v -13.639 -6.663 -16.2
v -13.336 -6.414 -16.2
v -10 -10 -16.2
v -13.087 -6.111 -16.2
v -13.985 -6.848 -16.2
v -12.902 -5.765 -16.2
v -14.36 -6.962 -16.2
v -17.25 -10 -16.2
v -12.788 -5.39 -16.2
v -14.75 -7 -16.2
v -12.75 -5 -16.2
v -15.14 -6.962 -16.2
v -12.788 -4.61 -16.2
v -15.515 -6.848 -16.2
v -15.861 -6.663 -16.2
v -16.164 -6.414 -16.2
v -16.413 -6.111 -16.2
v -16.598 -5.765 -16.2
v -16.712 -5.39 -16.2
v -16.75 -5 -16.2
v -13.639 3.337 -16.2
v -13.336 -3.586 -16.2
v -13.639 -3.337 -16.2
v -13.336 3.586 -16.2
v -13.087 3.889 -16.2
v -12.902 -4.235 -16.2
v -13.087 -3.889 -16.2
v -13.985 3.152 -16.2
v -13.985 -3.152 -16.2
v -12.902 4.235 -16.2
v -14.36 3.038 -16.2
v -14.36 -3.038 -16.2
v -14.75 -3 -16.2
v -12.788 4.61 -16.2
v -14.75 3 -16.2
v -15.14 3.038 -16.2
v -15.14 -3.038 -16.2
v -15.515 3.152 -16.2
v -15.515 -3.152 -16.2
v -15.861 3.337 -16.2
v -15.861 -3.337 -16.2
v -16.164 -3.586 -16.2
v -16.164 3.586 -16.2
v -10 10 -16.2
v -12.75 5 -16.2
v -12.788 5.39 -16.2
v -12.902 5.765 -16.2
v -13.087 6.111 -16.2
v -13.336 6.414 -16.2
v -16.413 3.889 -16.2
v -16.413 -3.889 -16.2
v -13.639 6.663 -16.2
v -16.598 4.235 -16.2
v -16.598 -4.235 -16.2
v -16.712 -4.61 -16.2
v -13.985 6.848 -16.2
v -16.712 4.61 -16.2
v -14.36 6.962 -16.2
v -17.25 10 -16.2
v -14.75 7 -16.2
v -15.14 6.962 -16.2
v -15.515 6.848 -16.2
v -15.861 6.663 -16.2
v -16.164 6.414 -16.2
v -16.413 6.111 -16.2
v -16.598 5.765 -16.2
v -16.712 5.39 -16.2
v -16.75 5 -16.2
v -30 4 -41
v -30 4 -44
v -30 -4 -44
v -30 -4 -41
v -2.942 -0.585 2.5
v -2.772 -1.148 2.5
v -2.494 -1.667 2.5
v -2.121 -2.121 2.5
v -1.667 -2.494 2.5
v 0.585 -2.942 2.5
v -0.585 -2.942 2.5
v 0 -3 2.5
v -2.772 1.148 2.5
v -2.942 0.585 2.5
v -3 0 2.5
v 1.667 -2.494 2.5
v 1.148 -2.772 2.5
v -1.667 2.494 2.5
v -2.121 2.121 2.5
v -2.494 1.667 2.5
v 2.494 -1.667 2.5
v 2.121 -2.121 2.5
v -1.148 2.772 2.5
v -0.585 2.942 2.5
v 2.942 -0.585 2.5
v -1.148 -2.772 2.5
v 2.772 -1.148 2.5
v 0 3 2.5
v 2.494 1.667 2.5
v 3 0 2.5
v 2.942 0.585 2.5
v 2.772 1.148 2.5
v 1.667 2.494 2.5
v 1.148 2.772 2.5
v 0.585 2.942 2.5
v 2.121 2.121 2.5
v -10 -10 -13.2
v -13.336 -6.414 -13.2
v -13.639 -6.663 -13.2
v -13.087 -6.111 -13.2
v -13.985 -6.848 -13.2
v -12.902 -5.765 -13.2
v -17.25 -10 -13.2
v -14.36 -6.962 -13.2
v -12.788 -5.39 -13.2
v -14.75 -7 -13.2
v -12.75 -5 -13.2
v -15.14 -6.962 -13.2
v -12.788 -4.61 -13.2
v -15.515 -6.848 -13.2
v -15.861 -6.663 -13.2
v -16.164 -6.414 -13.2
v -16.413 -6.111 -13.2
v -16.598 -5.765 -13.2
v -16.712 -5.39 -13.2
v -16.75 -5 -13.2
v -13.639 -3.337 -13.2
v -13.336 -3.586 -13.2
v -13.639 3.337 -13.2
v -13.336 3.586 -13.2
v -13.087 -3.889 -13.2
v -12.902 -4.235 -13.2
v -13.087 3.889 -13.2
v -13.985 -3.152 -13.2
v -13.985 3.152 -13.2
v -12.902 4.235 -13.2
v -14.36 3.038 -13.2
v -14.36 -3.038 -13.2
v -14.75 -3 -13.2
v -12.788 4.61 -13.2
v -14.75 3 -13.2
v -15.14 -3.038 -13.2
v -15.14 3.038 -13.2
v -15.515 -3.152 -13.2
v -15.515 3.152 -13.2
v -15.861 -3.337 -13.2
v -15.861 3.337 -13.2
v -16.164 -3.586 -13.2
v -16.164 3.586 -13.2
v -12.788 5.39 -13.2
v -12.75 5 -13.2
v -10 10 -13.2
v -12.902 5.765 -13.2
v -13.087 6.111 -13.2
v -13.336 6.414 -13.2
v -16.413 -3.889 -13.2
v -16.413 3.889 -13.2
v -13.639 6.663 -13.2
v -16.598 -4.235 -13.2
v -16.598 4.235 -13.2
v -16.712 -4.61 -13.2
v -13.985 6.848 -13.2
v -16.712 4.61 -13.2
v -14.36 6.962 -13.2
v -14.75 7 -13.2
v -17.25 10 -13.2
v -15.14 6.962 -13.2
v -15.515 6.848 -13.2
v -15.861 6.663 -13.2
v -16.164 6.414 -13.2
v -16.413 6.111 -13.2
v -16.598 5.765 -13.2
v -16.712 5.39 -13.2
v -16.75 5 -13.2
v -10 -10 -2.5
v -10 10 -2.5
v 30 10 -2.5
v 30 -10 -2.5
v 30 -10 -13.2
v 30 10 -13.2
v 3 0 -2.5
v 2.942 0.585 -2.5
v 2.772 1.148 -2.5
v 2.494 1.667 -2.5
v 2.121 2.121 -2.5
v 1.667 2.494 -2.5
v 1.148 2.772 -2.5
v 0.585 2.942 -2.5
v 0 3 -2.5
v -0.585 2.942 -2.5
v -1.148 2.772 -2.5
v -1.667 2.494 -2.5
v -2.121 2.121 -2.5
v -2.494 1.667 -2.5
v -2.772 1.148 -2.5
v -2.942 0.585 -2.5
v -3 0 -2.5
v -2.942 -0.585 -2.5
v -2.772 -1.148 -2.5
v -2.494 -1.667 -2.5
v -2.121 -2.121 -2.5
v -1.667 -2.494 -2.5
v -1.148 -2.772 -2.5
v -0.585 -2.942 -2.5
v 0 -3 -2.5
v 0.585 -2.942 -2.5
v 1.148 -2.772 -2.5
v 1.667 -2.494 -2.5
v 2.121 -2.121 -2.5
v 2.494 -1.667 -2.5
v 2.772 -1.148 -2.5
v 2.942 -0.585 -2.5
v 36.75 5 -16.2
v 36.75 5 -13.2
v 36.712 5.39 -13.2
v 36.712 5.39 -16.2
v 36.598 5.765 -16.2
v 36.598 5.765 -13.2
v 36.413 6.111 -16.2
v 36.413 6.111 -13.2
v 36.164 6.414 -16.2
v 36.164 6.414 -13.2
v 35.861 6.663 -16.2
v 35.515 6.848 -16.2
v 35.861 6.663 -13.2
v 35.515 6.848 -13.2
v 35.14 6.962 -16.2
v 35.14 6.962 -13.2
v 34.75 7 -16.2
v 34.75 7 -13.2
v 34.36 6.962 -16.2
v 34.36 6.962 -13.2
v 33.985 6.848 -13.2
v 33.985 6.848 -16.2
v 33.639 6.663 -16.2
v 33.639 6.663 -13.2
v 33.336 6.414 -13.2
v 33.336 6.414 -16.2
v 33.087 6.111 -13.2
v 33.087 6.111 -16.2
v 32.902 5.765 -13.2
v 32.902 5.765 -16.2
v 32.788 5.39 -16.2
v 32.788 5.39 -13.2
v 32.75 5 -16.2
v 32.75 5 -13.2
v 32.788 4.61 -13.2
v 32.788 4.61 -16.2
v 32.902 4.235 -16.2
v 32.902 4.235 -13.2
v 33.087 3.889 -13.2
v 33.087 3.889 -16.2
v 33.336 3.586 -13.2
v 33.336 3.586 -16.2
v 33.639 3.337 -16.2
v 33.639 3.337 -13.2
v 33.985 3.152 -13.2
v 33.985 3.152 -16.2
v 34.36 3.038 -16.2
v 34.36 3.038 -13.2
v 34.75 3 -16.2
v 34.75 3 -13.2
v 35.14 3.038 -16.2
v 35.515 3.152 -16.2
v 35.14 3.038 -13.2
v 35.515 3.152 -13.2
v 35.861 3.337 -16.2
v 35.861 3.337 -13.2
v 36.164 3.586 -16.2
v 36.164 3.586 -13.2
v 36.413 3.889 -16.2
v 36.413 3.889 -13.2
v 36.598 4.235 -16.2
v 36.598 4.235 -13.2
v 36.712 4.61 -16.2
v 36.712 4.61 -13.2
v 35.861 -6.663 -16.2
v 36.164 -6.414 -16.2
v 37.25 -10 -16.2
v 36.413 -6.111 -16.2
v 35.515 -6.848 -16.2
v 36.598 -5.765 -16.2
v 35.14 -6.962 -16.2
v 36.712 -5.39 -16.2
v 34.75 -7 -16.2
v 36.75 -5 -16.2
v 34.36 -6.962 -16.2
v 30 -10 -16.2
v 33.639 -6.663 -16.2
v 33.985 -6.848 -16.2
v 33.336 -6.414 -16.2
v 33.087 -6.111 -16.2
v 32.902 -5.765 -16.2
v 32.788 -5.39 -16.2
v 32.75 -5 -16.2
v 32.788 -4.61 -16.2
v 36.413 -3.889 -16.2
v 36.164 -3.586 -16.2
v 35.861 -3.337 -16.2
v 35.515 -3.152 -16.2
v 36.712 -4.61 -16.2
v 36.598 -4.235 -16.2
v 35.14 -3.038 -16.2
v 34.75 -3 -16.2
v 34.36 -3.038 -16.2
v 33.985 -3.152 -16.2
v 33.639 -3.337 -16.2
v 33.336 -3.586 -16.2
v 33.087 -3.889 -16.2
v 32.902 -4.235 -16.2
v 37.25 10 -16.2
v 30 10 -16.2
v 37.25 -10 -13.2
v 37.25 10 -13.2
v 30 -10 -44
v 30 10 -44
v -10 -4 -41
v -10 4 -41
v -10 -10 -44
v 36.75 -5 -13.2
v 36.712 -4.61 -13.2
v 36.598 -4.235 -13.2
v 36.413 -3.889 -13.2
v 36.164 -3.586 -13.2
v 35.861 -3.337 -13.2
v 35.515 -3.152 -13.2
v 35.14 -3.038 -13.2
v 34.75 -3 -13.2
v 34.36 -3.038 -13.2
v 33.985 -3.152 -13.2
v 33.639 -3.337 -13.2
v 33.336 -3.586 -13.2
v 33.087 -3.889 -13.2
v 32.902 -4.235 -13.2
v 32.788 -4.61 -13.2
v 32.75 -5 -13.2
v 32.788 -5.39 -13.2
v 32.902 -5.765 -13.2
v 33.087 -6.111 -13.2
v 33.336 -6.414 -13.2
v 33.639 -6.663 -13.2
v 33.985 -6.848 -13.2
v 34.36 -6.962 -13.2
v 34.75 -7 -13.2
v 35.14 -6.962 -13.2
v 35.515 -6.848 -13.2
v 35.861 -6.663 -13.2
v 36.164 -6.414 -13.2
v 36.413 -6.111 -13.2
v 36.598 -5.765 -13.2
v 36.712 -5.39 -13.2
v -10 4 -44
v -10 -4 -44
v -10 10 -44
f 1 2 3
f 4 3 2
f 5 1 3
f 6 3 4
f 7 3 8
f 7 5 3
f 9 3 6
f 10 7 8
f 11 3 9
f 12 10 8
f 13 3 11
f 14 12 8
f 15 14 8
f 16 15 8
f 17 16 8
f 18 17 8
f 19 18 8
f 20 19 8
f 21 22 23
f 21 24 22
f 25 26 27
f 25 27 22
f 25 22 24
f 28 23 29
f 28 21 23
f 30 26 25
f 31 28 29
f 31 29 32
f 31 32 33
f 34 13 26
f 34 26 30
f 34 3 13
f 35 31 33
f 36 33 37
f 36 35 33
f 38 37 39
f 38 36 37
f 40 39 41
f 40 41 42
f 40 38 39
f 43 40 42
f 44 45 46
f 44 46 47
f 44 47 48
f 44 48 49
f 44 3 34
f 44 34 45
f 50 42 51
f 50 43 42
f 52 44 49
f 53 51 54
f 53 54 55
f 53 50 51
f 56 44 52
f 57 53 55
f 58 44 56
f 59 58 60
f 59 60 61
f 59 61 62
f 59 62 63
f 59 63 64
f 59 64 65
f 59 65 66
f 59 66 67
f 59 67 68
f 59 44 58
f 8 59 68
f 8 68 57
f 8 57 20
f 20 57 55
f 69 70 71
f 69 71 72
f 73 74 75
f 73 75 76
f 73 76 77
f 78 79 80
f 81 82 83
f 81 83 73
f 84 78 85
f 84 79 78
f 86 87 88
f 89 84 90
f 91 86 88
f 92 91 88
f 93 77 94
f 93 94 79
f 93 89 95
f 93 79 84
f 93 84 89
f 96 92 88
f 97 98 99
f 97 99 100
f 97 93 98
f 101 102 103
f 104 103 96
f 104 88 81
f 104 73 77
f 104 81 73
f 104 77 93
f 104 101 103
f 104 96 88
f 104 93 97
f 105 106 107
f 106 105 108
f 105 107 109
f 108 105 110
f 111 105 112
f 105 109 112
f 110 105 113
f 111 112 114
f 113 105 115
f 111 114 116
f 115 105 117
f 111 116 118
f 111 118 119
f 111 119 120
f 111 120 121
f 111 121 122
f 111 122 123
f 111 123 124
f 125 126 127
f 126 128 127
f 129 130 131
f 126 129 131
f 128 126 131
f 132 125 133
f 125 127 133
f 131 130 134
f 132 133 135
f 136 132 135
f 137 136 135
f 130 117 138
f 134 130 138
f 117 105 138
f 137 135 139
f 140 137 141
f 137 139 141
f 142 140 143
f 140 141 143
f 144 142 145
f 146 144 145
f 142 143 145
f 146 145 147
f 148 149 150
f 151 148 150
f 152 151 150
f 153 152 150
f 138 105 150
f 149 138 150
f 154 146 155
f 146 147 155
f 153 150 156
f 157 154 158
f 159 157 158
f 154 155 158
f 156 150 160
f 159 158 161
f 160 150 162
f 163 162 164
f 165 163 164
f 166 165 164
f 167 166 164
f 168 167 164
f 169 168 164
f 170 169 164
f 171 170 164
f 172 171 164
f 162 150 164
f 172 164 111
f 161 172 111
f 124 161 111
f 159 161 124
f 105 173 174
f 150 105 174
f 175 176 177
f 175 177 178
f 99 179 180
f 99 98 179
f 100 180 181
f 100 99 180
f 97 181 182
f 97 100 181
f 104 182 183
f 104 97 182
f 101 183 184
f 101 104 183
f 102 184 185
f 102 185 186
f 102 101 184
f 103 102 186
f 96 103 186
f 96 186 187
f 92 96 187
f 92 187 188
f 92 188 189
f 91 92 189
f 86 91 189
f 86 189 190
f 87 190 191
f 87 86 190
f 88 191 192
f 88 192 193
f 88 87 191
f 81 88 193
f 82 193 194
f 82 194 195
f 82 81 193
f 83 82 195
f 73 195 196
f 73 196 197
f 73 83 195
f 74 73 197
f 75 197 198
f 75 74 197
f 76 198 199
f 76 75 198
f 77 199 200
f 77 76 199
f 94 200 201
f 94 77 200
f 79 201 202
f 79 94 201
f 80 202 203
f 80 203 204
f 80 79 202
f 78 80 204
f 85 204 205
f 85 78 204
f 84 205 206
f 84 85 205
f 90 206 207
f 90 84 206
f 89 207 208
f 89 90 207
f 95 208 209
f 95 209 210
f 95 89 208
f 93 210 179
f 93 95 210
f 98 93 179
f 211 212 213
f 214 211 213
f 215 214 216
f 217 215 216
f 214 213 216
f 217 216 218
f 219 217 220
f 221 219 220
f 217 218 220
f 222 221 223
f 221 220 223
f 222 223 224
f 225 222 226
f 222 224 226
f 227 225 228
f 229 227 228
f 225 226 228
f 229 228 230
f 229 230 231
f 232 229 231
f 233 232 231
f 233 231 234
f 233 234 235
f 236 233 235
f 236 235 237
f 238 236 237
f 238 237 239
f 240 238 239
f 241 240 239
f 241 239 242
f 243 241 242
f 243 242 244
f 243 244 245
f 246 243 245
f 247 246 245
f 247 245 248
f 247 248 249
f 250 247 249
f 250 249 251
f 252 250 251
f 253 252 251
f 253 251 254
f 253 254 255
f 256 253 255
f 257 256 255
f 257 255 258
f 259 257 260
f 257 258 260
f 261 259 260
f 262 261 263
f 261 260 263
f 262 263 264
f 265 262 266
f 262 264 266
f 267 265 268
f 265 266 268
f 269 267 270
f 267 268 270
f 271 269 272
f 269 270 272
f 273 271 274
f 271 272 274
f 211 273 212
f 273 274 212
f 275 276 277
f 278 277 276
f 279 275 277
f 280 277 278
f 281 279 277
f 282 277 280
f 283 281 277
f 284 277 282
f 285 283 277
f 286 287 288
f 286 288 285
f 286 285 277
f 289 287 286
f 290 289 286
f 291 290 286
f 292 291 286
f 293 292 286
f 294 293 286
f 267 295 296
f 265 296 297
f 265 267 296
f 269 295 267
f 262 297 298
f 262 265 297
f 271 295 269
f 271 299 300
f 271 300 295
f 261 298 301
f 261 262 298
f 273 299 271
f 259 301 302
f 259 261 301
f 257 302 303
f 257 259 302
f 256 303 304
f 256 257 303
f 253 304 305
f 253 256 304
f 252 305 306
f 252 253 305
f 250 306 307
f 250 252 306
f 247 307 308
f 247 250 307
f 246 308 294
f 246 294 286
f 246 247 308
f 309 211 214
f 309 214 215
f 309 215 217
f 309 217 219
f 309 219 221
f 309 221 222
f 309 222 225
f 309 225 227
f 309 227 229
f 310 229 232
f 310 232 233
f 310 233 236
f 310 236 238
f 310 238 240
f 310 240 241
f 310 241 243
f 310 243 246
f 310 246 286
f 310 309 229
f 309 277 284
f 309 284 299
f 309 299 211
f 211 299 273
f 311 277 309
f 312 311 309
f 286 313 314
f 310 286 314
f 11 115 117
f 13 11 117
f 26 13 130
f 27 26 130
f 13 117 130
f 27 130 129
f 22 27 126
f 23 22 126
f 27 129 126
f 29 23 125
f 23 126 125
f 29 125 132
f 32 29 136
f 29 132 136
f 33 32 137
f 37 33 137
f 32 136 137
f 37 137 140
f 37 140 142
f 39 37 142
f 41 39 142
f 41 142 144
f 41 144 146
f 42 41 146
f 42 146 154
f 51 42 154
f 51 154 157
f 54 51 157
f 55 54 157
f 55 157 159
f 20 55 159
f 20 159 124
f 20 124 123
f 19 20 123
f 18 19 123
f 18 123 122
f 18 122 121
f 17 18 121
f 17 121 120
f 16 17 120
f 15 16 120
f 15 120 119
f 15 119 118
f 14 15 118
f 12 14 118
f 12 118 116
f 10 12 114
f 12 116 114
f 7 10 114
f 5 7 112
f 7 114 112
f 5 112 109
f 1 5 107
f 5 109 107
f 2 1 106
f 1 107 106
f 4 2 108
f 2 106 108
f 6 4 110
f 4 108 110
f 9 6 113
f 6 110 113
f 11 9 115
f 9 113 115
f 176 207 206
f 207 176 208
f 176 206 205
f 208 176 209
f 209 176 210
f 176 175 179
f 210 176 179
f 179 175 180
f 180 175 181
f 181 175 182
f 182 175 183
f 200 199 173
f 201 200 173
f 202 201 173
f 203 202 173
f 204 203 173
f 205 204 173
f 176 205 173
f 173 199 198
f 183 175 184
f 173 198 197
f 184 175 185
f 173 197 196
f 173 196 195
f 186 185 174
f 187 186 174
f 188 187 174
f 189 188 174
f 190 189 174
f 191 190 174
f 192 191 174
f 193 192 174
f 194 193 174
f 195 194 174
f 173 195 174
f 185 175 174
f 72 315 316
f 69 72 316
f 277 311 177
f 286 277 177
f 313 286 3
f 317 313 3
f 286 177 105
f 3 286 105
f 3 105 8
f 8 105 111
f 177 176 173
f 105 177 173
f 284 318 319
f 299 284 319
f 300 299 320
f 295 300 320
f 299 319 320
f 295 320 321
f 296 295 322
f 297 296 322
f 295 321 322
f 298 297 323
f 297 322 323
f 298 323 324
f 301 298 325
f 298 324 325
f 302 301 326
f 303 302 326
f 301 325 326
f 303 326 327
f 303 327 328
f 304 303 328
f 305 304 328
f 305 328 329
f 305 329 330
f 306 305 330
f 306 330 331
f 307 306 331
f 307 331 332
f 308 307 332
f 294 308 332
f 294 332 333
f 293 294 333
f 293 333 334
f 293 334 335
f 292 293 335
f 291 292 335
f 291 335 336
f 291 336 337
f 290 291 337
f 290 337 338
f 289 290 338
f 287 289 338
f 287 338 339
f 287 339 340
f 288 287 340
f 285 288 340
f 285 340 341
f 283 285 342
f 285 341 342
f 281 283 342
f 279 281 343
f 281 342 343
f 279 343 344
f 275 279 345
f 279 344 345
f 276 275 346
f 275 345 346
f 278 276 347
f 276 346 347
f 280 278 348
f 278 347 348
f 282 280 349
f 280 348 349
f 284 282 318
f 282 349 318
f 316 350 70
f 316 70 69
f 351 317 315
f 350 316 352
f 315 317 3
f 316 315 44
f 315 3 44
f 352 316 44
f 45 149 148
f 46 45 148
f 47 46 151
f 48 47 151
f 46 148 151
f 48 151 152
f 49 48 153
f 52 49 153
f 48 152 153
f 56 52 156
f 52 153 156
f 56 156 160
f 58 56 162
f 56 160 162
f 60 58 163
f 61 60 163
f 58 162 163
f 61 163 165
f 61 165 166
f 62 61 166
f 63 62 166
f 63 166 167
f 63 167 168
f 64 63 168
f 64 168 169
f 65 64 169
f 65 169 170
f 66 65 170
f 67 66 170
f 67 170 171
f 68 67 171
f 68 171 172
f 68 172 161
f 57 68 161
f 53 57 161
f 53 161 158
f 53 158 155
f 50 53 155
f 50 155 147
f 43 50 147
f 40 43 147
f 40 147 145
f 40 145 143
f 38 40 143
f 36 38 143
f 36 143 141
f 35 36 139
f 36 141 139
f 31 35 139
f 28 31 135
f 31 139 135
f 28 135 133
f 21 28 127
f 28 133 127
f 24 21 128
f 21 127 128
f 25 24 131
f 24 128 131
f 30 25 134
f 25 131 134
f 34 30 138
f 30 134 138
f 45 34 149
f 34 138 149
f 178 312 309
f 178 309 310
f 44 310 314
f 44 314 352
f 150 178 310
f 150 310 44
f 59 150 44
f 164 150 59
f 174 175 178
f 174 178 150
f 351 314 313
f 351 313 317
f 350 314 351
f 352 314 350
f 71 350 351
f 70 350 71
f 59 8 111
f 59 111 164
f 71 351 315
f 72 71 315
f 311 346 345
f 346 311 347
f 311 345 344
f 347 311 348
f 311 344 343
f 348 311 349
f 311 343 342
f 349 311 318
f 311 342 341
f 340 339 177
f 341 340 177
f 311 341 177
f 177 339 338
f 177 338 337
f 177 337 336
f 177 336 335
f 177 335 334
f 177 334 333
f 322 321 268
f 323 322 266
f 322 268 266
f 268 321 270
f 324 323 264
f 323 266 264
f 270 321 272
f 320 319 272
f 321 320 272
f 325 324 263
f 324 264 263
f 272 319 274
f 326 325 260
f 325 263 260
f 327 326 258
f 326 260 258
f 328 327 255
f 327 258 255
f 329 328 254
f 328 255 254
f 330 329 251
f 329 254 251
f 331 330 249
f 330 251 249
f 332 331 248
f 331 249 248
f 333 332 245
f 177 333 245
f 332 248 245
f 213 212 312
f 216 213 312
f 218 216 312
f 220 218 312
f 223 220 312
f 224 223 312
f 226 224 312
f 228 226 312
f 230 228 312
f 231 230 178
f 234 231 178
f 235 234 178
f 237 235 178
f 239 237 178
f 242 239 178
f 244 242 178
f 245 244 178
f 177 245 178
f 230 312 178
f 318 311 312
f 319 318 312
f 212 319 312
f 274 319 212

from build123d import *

# Parameters (mm, degrees)
SKETCH1_R           = 3
BOSS_EXTRUDE1_DEPTH = 2.5
SKETCH2_W           = 40
SKETCH2_H           = 20
BOSS_EXTRUDE2_DEPTH = 41.5
BOSS_EXTRUDE3_START = -27.8
SKETCH3_W           = 7.25
SKETCH3_H           = 20
BOSS_EXTRUDE3_DEPTH = 3
SKETCH4_R           = 2
CUT_EXTRUDE1_DEPTH  = 50.357902103
SKETCH5_W           = 3
SKETCH5_H           = 8
BOSS_EXTRUDE4_DEPTH = 20


with BuildPart() as part:
    # Sketch1 → Boss-Extrude1 (new, symmetric)
    with BuildSketch(Plane.XY):
        Circle(SKETCH1_R)
    extrude(amount=BOSS_EXTRUDE1_DEPTH, both=True)

    # Sketch2 → Boss-Extrude2 (add)
    with BuildSketch(Plane(origin=(0, 0, -2.5), x_dir=(-1, 0, 0), z_dir=(0, 0, -1))):
        with Locations((-10, 0)):
            Rectangle(SKETCH2_W, SKETCH2_H)
    extrude(amount=BOSS_EXTRUDE2_DEPTH)

    # Sketch3 → Boss-Extrude3 (add)
    with BuildSketch(Plane(origin=(0, 0, -44), x_dir=(-1, 0, 0), z_dir=(0, 0, -1)).offset(BOSS_EXTRUDE3_START)):
        with Locations((-33.625, 0)):
            Rectangle(SKETCH3_W, SKETCH3_H)
        with Locations((13.625, 0)):
            Rectangle(SKETCH3_W, SKETCH3_H)
    extrude(amount=-BOSS_EXTRUDE3_DEPTH)

    # Sketch4 → Cut-Extrude1 (cut, through all)
    with BuildSketch(Plane.XY.offset(-13.2)):
        with Locations((-14.75, -5)):
            Circle(SKETCH4_R)
        with Locations((-14.75, 5)):
            Circle(SKETCH4_R)
        with Locations((34.75, 5)):
            Circle(SKETCH4_R)
        with Locations((34.75, -5)):
            Circle(SKETCH4_R)
    extrude(amount=-CUT_EXTRUDE1_DEPTH, mode=Mode.SUBTRACT)

    # Sketch5 → Boss-Extrude4 (add)
    with BuildSketch(Plane.ZY.offset(10)):
        with Locations((-42.5, 0)):
            Rectangle(SKETCH5_W, SKETCH5_H)
    extrude(amount=BOSS_EXTRUDE4_DEPTH)


solid = part.part
